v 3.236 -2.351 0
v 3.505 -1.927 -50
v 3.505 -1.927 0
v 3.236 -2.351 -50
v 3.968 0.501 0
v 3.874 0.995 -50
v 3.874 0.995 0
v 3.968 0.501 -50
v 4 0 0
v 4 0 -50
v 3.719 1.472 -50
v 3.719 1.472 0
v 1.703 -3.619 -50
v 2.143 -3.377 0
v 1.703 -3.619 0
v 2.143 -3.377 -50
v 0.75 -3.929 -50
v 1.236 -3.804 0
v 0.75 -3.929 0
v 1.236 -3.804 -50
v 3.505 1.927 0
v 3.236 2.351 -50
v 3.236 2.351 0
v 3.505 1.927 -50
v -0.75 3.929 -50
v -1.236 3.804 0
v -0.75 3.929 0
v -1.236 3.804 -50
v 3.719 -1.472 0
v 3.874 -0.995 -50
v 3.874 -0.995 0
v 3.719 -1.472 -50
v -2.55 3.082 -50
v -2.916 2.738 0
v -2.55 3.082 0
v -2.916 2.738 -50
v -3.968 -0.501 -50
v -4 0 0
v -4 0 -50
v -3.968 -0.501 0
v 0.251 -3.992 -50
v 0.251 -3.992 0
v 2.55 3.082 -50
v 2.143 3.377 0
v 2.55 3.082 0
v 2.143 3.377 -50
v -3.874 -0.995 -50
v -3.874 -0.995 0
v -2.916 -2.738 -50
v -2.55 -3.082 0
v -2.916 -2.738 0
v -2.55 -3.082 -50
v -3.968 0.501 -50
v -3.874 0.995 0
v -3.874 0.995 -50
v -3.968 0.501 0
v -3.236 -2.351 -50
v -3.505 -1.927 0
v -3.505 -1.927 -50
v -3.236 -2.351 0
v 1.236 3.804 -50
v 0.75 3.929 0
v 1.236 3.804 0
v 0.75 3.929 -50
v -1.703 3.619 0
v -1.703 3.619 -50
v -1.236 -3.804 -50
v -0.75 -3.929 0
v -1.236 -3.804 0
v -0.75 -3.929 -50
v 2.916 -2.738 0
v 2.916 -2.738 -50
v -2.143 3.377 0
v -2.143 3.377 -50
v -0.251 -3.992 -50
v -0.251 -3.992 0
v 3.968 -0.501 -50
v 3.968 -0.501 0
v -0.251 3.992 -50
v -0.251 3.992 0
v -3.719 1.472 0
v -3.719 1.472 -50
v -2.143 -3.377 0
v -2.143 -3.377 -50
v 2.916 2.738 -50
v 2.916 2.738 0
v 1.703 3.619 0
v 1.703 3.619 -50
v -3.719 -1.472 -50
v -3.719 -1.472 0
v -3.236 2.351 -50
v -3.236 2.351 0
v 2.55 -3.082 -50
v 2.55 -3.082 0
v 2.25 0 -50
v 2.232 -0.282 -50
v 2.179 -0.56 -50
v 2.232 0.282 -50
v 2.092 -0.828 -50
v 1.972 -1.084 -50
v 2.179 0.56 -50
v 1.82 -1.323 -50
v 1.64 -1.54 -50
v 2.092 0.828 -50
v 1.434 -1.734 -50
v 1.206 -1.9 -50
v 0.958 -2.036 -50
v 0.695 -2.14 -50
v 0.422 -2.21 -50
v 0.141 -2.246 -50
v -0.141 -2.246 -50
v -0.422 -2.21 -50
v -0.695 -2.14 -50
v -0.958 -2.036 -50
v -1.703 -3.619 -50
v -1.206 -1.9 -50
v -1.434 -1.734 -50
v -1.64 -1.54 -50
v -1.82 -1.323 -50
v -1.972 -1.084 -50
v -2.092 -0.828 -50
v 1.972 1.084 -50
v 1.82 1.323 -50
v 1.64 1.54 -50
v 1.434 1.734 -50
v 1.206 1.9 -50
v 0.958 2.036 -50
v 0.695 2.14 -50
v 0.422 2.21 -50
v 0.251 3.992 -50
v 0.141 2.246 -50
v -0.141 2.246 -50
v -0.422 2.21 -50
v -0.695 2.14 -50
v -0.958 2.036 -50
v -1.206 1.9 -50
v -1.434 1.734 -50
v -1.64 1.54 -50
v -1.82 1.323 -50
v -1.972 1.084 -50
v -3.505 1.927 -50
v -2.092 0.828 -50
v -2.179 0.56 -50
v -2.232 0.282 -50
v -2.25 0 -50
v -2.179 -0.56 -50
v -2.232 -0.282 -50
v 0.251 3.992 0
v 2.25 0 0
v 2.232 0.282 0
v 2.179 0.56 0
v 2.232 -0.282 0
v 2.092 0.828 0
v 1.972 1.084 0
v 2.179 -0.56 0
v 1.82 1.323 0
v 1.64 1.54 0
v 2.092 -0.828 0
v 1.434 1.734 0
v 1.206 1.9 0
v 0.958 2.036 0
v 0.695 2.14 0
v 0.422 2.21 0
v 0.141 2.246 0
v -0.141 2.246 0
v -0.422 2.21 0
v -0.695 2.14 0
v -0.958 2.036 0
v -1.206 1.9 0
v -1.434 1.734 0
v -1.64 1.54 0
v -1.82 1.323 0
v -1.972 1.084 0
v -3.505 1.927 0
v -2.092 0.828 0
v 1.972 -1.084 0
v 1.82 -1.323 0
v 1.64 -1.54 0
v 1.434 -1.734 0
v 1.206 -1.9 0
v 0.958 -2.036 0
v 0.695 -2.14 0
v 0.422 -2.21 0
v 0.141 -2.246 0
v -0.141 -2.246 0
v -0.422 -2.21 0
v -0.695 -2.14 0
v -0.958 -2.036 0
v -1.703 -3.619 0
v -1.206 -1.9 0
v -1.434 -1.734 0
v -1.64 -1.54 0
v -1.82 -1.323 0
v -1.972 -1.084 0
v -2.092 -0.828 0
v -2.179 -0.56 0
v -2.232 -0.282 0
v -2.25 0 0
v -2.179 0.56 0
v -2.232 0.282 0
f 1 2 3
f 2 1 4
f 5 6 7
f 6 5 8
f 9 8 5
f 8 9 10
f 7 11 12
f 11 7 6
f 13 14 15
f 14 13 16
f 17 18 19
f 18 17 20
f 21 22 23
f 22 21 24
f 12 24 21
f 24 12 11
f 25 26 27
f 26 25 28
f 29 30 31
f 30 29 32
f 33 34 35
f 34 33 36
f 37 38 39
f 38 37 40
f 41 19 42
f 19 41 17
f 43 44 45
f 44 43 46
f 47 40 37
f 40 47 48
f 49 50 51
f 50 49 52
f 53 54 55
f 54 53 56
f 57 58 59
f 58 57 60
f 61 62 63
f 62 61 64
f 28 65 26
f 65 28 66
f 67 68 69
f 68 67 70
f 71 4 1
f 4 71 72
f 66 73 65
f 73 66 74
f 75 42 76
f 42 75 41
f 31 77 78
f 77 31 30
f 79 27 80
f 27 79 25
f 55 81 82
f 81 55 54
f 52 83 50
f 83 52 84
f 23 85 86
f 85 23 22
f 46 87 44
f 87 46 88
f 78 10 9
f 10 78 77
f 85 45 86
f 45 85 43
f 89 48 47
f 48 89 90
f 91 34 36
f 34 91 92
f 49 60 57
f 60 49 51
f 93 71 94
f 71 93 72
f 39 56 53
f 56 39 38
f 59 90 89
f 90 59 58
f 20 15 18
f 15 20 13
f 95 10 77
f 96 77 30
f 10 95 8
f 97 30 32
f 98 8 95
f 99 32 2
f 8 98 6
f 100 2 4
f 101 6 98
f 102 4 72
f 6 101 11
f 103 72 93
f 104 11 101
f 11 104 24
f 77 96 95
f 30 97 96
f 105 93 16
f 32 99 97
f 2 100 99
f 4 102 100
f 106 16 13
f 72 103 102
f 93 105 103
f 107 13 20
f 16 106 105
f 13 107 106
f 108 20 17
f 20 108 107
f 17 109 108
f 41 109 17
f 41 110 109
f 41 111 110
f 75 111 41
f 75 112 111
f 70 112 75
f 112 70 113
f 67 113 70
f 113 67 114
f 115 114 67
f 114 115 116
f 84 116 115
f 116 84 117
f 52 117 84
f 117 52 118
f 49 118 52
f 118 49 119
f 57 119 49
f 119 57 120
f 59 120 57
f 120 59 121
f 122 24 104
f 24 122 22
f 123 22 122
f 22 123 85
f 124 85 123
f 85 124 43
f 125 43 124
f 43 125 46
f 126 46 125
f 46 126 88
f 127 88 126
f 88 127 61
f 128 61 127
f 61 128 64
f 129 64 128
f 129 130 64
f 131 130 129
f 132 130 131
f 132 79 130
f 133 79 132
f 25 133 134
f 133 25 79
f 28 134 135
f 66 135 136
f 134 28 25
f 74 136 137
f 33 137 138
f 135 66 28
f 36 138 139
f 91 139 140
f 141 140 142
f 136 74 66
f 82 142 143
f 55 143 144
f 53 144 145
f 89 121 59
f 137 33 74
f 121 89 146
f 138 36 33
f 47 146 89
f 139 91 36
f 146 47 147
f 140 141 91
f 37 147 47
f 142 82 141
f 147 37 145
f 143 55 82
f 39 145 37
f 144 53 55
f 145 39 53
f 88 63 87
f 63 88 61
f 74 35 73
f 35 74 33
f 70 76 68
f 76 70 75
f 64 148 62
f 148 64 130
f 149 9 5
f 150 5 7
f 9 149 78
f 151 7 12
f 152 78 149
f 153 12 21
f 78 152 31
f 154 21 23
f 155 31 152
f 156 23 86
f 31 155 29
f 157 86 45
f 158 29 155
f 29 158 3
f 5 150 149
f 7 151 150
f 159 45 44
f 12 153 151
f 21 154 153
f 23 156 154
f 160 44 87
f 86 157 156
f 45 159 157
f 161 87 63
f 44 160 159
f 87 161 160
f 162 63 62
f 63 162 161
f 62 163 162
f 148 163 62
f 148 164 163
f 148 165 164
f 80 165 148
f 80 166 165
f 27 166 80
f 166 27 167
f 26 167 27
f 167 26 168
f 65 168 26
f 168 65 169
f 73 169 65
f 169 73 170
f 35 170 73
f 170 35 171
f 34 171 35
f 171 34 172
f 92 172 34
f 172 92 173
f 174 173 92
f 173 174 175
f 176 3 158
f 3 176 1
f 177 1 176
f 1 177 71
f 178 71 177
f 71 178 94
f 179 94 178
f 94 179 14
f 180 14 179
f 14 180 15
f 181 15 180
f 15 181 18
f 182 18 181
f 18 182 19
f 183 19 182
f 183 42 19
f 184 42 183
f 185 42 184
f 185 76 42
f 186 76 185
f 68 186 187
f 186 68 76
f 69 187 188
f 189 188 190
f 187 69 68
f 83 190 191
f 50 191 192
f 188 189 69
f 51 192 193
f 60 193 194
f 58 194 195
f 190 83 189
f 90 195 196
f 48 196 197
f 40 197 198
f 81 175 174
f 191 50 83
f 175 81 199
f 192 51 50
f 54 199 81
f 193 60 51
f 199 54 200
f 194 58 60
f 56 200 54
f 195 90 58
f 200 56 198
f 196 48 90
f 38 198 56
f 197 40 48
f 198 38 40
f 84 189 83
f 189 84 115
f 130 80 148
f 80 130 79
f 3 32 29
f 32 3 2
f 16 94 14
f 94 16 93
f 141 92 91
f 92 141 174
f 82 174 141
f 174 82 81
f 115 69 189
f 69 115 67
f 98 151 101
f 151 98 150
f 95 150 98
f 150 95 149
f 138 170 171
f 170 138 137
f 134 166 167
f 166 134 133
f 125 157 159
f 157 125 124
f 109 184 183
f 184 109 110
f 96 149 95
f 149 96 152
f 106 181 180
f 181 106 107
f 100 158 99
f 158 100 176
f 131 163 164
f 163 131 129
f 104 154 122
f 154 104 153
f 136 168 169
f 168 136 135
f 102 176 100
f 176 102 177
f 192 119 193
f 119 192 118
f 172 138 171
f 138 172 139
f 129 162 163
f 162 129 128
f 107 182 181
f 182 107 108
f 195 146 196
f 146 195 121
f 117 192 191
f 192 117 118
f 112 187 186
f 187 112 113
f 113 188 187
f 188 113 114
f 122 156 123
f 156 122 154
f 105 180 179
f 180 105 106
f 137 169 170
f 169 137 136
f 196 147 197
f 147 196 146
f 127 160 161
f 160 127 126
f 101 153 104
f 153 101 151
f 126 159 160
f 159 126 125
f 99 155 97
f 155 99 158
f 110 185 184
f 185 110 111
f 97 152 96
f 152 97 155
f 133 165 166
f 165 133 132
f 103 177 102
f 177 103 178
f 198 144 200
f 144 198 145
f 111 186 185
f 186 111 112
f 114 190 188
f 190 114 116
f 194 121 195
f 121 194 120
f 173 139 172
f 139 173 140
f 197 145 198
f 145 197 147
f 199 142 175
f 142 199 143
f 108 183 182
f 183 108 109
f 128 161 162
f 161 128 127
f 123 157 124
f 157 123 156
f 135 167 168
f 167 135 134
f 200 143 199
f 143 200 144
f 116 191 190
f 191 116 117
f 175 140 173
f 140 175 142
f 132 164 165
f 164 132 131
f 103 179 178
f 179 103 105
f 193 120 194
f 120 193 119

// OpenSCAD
$fn = 50;


difference() {
	union() {
		translate(v = [0, 0, -50.0000000000]) {
			cylinder(h = 50, r = 4.0000000000);
		}
		cylinder(h = 0, r = 7.0000000000);
	}
	union() {
		#translate(v = [0, 0, -50]) {
			cylinder(h = 50, r = 2.2500000000);
		}
	}
}
